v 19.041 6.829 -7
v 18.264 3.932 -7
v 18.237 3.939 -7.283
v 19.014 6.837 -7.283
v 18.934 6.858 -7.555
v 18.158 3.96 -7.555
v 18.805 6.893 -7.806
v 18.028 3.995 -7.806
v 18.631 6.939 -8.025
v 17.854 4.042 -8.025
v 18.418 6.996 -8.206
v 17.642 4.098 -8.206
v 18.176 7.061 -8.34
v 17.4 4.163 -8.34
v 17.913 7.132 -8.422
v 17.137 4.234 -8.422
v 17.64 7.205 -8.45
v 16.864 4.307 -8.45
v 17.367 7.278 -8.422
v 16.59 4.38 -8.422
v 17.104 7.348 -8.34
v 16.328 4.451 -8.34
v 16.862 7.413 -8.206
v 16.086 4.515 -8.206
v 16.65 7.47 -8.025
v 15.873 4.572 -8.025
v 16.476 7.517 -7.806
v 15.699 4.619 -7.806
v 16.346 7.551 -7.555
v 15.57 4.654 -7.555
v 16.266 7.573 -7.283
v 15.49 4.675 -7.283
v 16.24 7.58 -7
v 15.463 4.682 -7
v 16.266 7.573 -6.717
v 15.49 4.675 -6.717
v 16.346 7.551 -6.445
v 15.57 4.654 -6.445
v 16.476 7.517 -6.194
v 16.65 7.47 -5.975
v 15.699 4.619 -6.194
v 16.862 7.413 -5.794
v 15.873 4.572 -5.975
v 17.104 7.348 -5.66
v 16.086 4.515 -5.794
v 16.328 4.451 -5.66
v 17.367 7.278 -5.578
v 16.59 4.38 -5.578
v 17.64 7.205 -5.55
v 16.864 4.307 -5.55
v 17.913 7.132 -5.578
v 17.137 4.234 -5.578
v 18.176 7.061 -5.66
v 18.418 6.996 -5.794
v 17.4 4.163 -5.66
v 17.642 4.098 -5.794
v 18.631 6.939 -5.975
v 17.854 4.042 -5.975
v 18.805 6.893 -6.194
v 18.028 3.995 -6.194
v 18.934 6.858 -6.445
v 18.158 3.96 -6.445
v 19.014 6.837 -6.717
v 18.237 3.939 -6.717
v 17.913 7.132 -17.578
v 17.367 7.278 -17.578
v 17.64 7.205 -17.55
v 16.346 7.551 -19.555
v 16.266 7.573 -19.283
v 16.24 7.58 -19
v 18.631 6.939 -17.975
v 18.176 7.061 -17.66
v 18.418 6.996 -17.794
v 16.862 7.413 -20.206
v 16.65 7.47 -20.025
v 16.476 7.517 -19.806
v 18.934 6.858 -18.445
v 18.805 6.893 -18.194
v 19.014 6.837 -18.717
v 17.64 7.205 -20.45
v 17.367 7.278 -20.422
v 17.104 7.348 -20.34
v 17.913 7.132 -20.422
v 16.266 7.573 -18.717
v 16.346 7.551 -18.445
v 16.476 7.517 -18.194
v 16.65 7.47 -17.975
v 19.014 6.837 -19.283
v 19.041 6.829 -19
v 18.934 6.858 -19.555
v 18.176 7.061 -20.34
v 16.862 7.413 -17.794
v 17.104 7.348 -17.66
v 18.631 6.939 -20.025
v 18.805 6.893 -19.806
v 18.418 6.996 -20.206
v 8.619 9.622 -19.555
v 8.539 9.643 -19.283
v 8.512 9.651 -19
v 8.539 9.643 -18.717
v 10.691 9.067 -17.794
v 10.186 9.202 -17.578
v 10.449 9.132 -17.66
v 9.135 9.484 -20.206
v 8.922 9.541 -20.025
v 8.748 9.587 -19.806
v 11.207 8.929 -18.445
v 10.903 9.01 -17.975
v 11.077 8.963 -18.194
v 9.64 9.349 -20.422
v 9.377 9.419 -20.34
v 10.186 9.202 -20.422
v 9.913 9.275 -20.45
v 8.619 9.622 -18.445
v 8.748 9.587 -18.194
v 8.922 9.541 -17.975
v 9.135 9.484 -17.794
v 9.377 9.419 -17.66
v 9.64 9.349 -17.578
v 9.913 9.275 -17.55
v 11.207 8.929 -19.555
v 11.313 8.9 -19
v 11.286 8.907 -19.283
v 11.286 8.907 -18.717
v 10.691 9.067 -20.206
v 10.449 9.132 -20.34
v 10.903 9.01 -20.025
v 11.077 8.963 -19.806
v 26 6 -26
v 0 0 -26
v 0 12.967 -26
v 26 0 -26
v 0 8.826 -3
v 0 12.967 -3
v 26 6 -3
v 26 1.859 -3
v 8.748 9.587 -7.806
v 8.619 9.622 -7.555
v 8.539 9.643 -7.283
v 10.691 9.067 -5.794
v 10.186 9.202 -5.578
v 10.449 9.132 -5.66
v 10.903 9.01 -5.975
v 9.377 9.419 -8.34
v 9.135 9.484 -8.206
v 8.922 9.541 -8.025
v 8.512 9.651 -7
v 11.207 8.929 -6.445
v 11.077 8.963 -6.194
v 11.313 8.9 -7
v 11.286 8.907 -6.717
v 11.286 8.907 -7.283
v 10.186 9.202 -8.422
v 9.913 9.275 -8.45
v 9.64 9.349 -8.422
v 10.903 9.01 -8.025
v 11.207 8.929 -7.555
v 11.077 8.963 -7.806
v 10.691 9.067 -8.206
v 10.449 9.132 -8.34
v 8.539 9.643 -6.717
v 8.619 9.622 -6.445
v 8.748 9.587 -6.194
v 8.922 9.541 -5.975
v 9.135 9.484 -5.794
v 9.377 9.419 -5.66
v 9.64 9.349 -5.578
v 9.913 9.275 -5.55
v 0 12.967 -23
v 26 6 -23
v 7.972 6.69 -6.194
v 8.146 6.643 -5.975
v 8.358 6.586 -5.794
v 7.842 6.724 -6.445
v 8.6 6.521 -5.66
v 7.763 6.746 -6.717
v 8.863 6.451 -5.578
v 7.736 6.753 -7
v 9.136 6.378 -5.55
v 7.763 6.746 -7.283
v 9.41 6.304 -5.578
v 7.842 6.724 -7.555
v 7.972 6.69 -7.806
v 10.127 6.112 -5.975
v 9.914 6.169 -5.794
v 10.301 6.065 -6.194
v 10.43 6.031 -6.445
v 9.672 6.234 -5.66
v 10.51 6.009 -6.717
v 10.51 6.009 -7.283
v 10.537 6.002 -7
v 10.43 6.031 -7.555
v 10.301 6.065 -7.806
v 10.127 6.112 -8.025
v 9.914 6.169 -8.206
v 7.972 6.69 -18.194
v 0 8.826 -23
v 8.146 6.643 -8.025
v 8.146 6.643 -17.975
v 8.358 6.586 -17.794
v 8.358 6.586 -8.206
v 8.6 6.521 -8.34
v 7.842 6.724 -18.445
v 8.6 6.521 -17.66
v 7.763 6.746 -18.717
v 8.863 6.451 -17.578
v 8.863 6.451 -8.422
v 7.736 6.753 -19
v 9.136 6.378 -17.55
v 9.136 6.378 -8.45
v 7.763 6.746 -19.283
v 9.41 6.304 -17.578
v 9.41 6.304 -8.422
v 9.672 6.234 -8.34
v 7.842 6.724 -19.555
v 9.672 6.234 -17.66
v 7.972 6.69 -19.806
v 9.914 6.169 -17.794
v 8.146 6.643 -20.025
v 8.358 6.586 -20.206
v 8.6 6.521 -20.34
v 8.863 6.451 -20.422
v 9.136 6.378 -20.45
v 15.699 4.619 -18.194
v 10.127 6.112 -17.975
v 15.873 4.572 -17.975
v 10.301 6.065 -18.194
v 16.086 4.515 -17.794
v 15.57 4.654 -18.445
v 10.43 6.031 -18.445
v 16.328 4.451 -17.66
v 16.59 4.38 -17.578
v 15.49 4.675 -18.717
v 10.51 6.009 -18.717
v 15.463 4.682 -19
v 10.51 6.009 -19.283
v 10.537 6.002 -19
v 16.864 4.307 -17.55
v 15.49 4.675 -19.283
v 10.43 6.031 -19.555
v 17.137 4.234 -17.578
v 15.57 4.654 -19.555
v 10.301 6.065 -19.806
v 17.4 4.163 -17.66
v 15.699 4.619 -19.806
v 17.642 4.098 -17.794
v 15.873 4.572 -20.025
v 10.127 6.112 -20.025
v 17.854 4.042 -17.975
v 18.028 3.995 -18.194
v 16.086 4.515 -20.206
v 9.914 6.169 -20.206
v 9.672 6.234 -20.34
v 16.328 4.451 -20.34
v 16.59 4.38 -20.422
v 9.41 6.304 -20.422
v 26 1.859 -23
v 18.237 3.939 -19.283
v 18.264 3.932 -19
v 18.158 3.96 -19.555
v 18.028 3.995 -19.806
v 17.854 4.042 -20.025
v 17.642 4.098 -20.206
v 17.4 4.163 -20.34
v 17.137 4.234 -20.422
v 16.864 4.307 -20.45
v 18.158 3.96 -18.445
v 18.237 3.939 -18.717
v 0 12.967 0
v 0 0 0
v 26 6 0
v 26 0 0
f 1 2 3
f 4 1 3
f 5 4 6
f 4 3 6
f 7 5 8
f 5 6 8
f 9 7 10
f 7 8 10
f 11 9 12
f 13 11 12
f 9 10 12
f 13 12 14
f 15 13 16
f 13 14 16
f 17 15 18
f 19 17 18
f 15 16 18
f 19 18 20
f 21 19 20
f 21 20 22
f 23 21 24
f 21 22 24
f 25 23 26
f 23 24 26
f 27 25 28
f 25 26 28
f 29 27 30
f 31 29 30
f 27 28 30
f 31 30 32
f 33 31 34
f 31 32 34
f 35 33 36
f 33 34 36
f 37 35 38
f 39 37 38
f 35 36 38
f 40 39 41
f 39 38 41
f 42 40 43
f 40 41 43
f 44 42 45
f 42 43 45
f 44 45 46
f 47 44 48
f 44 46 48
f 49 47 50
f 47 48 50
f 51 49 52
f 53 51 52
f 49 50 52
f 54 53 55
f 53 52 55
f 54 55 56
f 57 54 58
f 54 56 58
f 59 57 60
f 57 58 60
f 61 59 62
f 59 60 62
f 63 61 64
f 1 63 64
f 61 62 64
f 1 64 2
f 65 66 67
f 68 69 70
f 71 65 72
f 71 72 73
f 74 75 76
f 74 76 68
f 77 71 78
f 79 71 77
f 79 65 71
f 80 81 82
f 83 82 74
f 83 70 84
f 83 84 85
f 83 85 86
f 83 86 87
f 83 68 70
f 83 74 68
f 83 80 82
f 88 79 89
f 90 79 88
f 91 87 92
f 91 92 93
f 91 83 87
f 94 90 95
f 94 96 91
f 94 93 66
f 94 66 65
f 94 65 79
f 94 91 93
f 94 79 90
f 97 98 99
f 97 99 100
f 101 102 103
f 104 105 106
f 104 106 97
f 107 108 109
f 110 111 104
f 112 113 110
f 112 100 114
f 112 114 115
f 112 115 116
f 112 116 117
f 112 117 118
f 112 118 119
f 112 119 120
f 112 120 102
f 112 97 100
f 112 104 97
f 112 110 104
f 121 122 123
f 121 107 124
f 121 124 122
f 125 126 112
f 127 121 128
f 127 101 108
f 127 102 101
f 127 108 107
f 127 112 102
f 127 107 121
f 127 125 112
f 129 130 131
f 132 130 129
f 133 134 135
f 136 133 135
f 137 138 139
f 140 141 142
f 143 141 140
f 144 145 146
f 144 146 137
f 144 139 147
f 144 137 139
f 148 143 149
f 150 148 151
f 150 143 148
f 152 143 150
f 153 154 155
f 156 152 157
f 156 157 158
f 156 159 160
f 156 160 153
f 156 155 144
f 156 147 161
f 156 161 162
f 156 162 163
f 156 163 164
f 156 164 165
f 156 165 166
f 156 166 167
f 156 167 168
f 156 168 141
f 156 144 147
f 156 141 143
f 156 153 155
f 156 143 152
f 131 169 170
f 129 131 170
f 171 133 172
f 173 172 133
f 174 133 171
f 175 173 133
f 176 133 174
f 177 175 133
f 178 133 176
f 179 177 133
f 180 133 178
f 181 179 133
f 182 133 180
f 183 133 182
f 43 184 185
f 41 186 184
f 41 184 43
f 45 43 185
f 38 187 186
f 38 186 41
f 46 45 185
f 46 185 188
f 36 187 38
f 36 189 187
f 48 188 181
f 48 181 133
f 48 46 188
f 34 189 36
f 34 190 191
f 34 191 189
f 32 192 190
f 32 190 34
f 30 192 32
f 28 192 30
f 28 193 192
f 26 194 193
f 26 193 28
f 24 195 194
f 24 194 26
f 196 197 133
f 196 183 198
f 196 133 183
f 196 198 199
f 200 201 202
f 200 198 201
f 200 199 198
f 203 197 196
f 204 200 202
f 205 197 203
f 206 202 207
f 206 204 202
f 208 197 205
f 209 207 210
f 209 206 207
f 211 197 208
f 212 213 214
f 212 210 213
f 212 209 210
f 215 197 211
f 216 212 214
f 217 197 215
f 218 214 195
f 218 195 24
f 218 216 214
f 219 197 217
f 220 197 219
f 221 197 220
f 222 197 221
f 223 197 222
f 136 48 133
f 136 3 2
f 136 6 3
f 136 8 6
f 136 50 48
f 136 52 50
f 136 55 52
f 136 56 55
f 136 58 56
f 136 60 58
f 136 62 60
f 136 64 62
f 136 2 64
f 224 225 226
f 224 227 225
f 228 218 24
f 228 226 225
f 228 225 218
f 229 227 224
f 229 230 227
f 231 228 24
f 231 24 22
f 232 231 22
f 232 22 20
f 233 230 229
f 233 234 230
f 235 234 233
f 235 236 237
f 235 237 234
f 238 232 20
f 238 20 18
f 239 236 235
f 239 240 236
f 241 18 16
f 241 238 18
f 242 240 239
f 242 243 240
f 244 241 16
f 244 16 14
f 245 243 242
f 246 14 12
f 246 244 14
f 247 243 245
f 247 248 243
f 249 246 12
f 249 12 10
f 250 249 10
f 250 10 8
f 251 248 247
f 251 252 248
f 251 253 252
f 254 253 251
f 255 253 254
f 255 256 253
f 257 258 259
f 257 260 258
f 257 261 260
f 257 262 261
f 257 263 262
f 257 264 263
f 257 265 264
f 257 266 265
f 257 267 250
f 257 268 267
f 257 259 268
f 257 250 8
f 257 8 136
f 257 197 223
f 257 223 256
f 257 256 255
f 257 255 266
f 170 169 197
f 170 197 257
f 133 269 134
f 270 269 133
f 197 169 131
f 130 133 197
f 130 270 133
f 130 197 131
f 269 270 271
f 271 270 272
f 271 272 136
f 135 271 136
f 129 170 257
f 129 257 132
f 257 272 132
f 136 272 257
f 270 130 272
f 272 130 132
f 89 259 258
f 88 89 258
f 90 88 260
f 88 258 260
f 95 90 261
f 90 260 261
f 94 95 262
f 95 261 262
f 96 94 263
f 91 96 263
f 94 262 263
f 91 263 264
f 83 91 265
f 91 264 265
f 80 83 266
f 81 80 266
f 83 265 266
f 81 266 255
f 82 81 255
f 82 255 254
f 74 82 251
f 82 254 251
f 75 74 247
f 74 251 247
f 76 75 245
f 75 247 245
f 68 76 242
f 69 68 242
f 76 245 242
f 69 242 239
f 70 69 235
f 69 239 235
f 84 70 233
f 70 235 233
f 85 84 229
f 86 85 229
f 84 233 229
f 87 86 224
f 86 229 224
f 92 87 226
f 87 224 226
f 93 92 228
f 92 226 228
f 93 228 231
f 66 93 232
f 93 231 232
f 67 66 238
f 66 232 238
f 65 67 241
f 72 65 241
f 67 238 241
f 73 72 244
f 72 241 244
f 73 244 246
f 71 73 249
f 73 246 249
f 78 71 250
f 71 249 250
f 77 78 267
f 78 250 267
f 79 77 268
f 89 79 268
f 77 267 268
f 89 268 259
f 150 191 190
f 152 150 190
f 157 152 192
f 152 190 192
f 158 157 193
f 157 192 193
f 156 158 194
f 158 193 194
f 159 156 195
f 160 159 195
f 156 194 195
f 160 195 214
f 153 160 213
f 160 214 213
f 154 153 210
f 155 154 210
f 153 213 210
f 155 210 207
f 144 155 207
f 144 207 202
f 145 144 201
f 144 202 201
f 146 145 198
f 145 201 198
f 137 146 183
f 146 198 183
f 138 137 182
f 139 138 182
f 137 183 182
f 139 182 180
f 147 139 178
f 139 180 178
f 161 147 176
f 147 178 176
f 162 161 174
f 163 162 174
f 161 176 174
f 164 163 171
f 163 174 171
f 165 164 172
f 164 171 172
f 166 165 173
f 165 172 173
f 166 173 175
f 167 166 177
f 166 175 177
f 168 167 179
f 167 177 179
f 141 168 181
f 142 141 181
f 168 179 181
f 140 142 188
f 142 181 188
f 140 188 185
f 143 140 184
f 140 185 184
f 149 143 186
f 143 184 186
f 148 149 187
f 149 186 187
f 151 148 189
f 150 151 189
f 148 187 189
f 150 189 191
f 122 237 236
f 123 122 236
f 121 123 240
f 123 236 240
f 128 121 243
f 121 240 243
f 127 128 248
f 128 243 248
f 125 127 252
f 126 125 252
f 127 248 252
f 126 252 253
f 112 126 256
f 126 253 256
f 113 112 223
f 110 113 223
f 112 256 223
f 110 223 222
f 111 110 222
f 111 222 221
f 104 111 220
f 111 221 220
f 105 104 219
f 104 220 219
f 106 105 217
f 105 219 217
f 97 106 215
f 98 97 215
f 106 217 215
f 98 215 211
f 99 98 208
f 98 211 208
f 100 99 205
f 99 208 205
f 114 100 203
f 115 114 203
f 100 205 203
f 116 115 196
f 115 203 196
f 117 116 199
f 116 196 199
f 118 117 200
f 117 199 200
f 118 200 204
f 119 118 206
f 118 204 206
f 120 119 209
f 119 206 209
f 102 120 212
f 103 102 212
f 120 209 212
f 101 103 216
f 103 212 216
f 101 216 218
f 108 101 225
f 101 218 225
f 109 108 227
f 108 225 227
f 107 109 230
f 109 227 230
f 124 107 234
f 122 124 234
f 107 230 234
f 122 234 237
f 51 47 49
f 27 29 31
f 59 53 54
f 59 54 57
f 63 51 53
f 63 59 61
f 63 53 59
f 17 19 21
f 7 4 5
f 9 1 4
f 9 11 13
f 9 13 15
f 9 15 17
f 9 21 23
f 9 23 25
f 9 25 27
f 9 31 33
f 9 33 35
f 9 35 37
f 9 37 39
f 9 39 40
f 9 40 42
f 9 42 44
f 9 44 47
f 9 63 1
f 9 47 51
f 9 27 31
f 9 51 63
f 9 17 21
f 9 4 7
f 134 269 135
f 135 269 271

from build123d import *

# Parameters (mm, degrees)
SKETCH1_W           = 26
SKETCH1_H           = 26
BOSS_EXTRUDE1_DEPTH = 12.966679003
CUT_EXTRUDE1_DEPTH  = 39.988905658
SKETCH3_W           = 50
SKETCH3_H           = 20
CUT_EXTRUDE2_DEPTH  = 4
SKETCH5_R           = 1.45
BOSS_EXTRUDE2_DEPTH = 3


with BuildPart() as part:
    # Sketch1 → Boss-Extrude1 (new body)
    with BuildSketch(Plane(origin=(0, 0, 0), x_dir=(1, 0, 0), z_dir=(0, 1, 0))):
        with Locations((13, 13)):
            Rectangle(SKETCH1_W, SKETCH1_H)
    extrude(amount=BOSS_EXTRUDE1_DEPTH)

    # Sketch2 → Cut-Extrude1 (cut, through all)
    with BuildSketch(Plane.XY):
        Polygon((0, 12.966679003), (26, 6), (26, 12.966679003), align=None)
    extrude(amount=-CUT_EXTRUDE1_DEPTH, mode=Mode.SUBTRACT)

    # Sketch3 → Cut-Extrude2 (cut)
    with BuildSketch(Plane(origin=(3.241669751, 12.098076211, 0), x_dir=(0.9659258262890681, -0.25881904510252174, 0), z_dir=(0.2588190451025217, 0.965925826289068, 0))):
        with Locations((21.643976522, 13)):
            Rectangle(SKETCH3_W, SKETCH3_H)
    extrude(amount=-CUT_EXTRUDE2_DEPTH, mode=Mode.SUBTRACT)

    # Sketch5 → Boss-Extrude2 (add)
    with BuildSketch(Plane(origin=(2.20639357, 8.234372906, 0), x_dir=(0.9659258262890681, -0.2588190451025218, 0), z_dir=(0.25881904510252174, 0.965925826289068, 0))):
        with Locations((7.174363637, 19)):
            Circle(SKETCH5_R)
        with Locations((7.174363637, 7)):
            Circle(SKETCH5_R)
        with Locations((15.174363637, 19)):
            Circle(SKETCH5_R)
        with Locations((15.174363637, 7)):
            Circle(SKETCH5_R)
    extrude(amount=BOSS_EXTRUDE2_DEPTH)


solid = part.part
